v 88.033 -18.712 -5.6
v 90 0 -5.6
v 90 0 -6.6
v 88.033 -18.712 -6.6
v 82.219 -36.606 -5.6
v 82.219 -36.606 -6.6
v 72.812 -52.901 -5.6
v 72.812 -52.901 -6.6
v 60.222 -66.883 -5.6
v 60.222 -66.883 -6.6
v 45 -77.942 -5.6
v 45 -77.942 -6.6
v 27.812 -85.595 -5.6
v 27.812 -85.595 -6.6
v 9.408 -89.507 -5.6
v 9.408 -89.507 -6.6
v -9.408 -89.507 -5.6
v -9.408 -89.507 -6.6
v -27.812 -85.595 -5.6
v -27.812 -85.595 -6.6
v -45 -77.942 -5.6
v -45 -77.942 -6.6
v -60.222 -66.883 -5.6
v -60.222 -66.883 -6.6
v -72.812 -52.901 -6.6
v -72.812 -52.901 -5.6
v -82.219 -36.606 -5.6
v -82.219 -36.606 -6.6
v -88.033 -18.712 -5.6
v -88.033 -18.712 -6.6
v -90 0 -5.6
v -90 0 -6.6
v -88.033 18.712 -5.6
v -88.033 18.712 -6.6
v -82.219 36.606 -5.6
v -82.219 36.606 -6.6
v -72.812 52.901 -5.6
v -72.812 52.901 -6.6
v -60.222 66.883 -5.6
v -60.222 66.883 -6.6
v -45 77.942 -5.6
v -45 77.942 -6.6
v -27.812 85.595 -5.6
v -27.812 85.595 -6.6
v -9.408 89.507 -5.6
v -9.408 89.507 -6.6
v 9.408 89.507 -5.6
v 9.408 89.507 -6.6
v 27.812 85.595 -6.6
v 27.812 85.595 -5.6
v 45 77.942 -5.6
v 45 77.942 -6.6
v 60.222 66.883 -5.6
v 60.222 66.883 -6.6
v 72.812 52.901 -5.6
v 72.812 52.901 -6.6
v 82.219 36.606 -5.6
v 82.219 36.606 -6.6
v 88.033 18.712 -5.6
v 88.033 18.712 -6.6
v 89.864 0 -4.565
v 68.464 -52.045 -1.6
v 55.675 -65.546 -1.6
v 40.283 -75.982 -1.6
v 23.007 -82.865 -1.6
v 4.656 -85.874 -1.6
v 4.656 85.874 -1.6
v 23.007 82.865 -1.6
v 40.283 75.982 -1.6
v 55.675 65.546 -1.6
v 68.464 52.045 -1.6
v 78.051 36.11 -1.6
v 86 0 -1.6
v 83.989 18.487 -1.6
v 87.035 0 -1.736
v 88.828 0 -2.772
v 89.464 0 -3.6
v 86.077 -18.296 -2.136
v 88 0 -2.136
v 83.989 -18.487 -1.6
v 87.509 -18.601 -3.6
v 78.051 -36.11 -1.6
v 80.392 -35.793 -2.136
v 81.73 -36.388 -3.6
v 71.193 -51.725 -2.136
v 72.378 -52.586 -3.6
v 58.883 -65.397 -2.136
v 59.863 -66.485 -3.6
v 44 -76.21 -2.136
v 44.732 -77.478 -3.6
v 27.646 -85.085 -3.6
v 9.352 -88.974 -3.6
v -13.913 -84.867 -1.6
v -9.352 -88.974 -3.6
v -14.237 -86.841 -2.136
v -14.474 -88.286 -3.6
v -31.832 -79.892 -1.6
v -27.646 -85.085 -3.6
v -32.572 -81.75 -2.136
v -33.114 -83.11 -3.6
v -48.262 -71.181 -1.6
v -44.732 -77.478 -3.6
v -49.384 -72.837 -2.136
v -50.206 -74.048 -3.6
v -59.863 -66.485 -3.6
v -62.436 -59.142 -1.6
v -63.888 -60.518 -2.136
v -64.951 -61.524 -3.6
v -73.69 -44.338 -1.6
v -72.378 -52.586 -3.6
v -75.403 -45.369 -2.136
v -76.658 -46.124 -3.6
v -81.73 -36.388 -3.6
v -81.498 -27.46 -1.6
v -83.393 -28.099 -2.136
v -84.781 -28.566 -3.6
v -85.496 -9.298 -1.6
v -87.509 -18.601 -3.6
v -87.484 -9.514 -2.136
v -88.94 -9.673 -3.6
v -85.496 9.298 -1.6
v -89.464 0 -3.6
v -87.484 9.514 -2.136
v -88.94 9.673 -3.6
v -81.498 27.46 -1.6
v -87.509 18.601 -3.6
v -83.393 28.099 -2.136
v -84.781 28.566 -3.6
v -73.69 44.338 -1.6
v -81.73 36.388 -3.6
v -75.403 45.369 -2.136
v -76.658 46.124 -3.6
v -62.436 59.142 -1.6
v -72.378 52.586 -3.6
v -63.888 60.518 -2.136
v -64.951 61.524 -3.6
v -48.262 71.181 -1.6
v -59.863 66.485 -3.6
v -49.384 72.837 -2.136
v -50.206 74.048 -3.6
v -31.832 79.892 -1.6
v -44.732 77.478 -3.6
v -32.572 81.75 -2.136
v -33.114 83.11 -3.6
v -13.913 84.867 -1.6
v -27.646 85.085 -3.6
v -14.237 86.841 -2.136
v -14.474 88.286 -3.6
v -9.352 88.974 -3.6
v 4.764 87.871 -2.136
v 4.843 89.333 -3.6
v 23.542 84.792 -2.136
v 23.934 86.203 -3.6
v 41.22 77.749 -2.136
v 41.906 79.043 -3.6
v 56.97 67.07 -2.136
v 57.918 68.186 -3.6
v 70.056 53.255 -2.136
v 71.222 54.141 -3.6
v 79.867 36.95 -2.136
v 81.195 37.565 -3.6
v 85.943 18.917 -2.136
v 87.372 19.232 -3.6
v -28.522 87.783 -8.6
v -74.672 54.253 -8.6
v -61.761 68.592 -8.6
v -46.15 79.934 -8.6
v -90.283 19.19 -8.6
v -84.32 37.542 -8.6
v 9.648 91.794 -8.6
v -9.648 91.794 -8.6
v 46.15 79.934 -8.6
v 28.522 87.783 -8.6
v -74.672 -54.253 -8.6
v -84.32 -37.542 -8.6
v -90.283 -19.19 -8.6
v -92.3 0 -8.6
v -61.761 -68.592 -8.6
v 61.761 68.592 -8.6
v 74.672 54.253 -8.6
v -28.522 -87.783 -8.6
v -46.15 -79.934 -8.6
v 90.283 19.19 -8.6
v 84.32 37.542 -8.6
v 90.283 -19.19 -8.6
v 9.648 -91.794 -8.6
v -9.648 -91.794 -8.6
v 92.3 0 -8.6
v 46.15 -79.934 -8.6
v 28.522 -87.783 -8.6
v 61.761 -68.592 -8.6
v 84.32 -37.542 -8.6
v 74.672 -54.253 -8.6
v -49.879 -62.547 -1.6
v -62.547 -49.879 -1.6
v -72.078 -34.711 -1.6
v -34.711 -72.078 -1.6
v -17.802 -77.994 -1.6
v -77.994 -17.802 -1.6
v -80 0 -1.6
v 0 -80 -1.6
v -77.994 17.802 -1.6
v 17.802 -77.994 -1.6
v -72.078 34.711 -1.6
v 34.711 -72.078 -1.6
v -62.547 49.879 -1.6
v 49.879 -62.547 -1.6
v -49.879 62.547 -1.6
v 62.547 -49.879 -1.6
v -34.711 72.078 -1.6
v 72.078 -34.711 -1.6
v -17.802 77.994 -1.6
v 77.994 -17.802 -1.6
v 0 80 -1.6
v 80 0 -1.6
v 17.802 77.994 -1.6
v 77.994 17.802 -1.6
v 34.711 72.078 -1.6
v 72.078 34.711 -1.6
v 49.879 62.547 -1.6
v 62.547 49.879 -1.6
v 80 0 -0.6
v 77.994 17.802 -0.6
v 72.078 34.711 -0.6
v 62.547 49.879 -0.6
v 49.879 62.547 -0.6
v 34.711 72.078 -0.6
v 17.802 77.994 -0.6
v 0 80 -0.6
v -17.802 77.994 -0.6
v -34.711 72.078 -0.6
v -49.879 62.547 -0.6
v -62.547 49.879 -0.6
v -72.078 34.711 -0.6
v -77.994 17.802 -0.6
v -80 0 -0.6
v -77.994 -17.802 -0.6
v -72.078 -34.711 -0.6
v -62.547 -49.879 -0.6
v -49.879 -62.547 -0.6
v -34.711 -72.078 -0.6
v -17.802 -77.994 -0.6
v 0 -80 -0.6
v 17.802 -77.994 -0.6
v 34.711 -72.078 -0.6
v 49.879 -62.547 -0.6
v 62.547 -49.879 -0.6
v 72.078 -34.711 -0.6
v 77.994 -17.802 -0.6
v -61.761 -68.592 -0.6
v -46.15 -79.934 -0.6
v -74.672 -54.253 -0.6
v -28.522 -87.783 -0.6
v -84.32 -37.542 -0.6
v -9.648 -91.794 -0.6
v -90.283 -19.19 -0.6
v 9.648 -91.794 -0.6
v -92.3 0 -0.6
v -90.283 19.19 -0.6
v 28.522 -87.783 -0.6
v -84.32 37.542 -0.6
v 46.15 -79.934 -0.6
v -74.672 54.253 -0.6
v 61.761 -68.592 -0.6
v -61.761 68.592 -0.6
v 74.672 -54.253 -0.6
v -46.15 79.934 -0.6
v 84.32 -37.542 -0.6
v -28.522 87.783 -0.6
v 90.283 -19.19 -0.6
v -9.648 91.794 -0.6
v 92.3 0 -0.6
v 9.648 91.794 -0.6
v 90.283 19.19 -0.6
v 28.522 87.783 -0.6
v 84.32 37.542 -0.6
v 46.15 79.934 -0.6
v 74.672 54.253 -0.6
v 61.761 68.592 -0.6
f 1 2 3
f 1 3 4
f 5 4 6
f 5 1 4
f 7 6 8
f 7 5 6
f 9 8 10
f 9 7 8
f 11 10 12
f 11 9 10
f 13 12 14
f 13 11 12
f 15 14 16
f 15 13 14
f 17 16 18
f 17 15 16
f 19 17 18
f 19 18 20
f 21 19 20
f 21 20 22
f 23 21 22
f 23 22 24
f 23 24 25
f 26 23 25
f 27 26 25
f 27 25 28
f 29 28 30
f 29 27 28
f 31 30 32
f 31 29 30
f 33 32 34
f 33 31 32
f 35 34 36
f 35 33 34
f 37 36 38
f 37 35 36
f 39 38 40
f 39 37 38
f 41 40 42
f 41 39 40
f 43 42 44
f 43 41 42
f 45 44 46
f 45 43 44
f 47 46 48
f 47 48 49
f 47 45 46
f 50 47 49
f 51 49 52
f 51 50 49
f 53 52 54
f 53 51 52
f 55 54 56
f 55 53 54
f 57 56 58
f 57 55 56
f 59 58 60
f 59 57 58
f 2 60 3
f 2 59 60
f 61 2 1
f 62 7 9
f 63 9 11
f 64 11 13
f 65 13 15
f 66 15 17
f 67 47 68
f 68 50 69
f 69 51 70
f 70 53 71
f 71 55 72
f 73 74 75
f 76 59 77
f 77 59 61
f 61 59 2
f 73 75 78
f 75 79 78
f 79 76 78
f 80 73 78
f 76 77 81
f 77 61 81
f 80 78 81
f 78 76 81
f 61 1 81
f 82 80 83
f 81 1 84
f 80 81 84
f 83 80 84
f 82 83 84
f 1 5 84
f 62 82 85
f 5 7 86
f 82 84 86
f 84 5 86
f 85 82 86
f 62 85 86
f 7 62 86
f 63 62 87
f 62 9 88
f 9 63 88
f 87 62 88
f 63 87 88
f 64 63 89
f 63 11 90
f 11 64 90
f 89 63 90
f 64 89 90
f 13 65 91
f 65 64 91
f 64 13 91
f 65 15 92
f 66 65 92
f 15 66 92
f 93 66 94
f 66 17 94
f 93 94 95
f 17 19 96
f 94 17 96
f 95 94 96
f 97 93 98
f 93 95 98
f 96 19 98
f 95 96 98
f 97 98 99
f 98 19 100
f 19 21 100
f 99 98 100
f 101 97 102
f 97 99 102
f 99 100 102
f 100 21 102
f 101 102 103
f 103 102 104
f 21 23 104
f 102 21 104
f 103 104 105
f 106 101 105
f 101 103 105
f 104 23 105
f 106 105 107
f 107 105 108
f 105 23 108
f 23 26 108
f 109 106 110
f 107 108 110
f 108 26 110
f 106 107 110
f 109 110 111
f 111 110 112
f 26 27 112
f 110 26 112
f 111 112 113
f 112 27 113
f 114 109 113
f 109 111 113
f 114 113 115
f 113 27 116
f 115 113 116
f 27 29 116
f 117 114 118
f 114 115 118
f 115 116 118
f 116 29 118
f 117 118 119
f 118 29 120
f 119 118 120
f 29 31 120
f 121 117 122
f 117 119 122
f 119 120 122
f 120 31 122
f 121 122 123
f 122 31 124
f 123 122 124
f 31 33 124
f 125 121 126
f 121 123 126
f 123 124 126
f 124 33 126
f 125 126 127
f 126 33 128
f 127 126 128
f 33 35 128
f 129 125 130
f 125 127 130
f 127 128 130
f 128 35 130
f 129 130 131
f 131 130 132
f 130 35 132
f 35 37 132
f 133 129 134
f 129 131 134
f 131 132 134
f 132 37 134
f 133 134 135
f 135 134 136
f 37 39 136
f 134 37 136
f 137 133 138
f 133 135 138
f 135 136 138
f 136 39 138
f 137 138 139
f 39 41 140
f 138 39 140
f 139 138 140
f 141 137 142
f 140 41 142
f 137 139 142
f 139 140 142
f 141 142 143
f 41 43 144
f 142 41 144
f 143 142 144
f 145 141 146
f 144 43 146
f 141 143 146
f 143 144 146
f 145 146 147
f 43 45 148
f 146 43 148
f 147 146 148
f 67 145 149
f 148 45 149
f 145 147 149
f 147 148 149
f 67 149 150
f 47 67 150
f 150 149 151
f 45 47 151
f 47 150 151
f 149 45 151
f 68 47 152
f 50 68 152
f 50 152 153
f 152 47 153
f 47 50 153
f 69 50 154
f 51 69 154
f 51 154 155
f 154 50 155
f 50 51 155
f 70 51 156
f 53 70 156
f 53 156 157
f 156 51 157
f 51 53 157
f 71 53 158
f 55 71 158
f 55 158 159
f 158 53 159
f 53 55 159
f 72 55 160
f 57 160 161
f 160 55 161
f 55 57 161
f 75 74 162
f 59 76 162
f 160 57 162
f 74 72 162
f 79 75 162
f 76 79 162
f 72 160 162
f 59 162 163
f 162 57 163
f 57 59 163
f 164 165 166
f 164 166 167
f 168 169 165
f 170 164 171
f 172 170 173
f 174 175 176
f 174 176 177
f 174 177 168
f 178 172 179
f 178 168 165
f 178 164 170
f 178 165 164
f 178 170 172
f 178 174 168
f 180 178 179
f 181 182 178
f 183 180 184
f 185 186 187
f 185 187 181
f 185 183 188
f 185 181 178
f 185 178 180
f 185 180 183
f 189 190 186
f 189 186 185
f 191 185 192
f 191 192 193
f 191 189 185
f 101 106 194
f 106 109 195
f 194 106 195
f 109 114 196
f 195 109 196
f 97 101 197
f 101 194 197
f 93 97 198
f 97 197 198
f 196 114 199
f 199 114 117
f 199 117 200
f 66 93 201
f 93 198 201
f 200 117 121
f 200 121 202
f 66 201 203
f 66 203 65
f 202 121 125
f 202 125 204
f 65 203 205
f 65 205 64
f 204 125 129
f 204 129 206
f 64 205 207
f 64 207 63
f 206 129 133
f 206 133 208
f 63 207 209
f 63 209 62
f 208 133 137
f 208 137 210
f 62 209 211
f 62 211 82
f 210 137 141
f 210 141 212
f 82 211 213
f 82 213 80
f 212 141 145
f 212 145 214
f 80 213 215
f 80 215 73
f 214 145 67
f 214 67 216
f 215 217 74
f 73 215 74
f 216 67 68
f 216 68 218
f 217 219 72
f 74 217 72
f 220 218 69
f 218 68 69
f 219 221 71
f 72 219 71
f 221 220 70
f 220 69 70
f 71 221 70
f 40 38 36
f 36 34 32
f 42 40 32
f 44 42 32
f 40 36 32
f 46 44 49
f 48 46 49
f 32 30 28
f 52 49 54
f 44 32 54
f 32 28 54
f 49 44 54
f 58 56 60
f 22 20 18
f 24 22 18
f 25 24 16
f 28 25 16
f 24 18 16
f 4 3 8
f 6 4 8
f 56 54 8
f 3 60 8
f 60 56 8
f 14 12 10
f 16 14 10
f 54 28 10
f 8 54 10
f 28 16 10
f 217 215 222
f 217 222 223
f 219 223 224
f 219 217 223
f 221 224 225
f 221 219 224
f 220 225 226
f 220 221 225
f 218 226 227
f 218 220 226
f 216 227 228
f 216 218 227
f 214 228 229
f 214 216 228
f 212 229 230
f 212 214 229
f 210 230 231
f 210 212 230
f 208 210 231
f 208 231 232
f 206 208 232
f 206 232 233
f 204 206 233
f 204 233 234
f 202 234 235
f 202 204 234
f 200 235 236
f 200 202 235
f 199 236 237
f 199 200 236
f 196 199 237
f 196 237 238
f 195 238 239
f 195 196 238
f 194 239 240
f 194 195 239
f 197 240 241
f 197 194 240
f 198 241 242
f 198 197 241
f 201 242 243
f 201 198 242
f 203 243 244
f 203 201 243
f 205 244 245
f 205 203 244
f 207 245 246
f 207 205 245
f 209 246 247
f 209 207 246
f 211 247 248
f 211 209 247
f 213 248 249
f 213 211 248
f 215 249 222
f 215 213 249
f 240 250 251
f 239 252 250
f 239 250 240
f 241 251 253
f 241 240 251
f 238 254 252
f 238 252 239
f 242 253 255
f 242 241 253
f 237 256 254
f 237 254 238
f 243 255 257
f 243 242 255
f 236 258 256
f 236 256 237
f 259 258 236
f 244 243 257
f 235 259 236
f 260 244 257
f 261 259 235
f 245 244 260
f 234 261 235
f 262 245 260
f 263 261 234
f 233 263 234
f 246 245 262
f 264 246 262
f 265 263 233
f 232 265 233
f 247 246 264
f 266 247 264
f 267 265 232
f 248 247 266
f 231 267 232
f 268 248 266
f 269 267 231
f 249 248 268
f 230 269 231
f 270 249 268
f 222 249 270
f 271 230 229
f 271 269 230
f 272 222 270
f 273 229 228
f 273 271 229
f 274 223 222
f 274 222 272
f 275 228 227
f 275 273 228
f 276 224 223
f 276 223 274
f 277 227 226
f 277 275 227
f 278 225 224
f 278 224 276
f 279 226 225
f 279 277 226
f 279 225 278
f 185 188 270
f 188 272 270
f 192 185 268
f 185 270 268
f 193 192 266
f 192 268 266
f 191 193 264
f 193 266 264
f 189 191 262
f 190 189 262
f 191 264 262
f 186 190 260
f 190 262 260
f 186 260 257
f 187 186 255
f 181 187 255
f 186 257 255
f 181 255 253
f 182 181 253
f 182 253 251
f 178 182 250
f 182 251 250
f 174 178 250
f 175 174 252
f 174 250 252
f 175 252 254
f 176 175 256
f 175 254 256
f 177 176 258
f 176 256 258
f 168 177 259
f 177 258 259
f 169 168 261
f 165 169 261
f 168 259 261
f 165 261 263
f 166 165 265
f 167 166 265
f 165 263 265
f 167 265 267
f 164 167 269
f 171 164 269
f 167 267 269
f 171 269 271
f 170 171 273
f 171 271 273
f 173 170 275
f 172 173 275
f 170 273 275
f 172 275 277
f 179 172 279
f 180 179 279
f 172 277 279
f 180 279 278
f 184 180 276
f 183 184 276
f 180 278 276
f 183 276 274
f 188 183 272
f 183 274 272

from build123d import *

# Parameters (mm, degrees)
SKETCH040_R   = 92.3
SKETCH040_R_2 = 80
PAD025_DEPTH  = 1
SKETCH041_R   = 92.3
SKETCH041_R_2 = 90
PAD026_DEPTH  = 5
FILLET_R      = 4
SKETCH042_R   = 92.3
PAD027_DEPTH  = 2


with BuildPart() as part:
    # Sketch040 → Pad025 (new body)
    with BuildSketch(Plane.XY):
        Circle(SKETCH040_R)
        Circle(SKETCH040_R_2, mode=Mode.SUBTRACT)
    extrude(amount=PAD025_DEPTH)

    # Sketch041 (on Face3 of Pad025) → Pad026 (join)
    with BuildSketch(Plane(origin=(0, 0, 0), x_dir=(1, 0, 0), z_dir=(0, 0, -1))):
        Circle(SKETCH041_R)
        Circle(SKETCH041_R_2, mode=Mode.SUBTRACT)
    extrude(amount=PAD026_DEPTH)

    # Fillet
    fillet_edges = [part.edges().sort_by_distance(p)[0] for p in [
        (-90, 0, 0),
    ]]
    fillet(fillet_edges, radius=FILLET_R)

    # Sketch042 (on Face3 of Fillet) → Pad027 (join)
    with BuildSketch(Plane(origin=(0, 0, -5), x_dir=(1, 0, 0), z_dir=(0, 0, -1))):
        Circle(SKETCH042_R)
    extrude(amount=PAD027_DEPTH)


with BuildPart() as part_1:
    # Body025 placement: moved
    add(part.part.moved(Location((0, 0, -1.6))))


solid = part_1.part
